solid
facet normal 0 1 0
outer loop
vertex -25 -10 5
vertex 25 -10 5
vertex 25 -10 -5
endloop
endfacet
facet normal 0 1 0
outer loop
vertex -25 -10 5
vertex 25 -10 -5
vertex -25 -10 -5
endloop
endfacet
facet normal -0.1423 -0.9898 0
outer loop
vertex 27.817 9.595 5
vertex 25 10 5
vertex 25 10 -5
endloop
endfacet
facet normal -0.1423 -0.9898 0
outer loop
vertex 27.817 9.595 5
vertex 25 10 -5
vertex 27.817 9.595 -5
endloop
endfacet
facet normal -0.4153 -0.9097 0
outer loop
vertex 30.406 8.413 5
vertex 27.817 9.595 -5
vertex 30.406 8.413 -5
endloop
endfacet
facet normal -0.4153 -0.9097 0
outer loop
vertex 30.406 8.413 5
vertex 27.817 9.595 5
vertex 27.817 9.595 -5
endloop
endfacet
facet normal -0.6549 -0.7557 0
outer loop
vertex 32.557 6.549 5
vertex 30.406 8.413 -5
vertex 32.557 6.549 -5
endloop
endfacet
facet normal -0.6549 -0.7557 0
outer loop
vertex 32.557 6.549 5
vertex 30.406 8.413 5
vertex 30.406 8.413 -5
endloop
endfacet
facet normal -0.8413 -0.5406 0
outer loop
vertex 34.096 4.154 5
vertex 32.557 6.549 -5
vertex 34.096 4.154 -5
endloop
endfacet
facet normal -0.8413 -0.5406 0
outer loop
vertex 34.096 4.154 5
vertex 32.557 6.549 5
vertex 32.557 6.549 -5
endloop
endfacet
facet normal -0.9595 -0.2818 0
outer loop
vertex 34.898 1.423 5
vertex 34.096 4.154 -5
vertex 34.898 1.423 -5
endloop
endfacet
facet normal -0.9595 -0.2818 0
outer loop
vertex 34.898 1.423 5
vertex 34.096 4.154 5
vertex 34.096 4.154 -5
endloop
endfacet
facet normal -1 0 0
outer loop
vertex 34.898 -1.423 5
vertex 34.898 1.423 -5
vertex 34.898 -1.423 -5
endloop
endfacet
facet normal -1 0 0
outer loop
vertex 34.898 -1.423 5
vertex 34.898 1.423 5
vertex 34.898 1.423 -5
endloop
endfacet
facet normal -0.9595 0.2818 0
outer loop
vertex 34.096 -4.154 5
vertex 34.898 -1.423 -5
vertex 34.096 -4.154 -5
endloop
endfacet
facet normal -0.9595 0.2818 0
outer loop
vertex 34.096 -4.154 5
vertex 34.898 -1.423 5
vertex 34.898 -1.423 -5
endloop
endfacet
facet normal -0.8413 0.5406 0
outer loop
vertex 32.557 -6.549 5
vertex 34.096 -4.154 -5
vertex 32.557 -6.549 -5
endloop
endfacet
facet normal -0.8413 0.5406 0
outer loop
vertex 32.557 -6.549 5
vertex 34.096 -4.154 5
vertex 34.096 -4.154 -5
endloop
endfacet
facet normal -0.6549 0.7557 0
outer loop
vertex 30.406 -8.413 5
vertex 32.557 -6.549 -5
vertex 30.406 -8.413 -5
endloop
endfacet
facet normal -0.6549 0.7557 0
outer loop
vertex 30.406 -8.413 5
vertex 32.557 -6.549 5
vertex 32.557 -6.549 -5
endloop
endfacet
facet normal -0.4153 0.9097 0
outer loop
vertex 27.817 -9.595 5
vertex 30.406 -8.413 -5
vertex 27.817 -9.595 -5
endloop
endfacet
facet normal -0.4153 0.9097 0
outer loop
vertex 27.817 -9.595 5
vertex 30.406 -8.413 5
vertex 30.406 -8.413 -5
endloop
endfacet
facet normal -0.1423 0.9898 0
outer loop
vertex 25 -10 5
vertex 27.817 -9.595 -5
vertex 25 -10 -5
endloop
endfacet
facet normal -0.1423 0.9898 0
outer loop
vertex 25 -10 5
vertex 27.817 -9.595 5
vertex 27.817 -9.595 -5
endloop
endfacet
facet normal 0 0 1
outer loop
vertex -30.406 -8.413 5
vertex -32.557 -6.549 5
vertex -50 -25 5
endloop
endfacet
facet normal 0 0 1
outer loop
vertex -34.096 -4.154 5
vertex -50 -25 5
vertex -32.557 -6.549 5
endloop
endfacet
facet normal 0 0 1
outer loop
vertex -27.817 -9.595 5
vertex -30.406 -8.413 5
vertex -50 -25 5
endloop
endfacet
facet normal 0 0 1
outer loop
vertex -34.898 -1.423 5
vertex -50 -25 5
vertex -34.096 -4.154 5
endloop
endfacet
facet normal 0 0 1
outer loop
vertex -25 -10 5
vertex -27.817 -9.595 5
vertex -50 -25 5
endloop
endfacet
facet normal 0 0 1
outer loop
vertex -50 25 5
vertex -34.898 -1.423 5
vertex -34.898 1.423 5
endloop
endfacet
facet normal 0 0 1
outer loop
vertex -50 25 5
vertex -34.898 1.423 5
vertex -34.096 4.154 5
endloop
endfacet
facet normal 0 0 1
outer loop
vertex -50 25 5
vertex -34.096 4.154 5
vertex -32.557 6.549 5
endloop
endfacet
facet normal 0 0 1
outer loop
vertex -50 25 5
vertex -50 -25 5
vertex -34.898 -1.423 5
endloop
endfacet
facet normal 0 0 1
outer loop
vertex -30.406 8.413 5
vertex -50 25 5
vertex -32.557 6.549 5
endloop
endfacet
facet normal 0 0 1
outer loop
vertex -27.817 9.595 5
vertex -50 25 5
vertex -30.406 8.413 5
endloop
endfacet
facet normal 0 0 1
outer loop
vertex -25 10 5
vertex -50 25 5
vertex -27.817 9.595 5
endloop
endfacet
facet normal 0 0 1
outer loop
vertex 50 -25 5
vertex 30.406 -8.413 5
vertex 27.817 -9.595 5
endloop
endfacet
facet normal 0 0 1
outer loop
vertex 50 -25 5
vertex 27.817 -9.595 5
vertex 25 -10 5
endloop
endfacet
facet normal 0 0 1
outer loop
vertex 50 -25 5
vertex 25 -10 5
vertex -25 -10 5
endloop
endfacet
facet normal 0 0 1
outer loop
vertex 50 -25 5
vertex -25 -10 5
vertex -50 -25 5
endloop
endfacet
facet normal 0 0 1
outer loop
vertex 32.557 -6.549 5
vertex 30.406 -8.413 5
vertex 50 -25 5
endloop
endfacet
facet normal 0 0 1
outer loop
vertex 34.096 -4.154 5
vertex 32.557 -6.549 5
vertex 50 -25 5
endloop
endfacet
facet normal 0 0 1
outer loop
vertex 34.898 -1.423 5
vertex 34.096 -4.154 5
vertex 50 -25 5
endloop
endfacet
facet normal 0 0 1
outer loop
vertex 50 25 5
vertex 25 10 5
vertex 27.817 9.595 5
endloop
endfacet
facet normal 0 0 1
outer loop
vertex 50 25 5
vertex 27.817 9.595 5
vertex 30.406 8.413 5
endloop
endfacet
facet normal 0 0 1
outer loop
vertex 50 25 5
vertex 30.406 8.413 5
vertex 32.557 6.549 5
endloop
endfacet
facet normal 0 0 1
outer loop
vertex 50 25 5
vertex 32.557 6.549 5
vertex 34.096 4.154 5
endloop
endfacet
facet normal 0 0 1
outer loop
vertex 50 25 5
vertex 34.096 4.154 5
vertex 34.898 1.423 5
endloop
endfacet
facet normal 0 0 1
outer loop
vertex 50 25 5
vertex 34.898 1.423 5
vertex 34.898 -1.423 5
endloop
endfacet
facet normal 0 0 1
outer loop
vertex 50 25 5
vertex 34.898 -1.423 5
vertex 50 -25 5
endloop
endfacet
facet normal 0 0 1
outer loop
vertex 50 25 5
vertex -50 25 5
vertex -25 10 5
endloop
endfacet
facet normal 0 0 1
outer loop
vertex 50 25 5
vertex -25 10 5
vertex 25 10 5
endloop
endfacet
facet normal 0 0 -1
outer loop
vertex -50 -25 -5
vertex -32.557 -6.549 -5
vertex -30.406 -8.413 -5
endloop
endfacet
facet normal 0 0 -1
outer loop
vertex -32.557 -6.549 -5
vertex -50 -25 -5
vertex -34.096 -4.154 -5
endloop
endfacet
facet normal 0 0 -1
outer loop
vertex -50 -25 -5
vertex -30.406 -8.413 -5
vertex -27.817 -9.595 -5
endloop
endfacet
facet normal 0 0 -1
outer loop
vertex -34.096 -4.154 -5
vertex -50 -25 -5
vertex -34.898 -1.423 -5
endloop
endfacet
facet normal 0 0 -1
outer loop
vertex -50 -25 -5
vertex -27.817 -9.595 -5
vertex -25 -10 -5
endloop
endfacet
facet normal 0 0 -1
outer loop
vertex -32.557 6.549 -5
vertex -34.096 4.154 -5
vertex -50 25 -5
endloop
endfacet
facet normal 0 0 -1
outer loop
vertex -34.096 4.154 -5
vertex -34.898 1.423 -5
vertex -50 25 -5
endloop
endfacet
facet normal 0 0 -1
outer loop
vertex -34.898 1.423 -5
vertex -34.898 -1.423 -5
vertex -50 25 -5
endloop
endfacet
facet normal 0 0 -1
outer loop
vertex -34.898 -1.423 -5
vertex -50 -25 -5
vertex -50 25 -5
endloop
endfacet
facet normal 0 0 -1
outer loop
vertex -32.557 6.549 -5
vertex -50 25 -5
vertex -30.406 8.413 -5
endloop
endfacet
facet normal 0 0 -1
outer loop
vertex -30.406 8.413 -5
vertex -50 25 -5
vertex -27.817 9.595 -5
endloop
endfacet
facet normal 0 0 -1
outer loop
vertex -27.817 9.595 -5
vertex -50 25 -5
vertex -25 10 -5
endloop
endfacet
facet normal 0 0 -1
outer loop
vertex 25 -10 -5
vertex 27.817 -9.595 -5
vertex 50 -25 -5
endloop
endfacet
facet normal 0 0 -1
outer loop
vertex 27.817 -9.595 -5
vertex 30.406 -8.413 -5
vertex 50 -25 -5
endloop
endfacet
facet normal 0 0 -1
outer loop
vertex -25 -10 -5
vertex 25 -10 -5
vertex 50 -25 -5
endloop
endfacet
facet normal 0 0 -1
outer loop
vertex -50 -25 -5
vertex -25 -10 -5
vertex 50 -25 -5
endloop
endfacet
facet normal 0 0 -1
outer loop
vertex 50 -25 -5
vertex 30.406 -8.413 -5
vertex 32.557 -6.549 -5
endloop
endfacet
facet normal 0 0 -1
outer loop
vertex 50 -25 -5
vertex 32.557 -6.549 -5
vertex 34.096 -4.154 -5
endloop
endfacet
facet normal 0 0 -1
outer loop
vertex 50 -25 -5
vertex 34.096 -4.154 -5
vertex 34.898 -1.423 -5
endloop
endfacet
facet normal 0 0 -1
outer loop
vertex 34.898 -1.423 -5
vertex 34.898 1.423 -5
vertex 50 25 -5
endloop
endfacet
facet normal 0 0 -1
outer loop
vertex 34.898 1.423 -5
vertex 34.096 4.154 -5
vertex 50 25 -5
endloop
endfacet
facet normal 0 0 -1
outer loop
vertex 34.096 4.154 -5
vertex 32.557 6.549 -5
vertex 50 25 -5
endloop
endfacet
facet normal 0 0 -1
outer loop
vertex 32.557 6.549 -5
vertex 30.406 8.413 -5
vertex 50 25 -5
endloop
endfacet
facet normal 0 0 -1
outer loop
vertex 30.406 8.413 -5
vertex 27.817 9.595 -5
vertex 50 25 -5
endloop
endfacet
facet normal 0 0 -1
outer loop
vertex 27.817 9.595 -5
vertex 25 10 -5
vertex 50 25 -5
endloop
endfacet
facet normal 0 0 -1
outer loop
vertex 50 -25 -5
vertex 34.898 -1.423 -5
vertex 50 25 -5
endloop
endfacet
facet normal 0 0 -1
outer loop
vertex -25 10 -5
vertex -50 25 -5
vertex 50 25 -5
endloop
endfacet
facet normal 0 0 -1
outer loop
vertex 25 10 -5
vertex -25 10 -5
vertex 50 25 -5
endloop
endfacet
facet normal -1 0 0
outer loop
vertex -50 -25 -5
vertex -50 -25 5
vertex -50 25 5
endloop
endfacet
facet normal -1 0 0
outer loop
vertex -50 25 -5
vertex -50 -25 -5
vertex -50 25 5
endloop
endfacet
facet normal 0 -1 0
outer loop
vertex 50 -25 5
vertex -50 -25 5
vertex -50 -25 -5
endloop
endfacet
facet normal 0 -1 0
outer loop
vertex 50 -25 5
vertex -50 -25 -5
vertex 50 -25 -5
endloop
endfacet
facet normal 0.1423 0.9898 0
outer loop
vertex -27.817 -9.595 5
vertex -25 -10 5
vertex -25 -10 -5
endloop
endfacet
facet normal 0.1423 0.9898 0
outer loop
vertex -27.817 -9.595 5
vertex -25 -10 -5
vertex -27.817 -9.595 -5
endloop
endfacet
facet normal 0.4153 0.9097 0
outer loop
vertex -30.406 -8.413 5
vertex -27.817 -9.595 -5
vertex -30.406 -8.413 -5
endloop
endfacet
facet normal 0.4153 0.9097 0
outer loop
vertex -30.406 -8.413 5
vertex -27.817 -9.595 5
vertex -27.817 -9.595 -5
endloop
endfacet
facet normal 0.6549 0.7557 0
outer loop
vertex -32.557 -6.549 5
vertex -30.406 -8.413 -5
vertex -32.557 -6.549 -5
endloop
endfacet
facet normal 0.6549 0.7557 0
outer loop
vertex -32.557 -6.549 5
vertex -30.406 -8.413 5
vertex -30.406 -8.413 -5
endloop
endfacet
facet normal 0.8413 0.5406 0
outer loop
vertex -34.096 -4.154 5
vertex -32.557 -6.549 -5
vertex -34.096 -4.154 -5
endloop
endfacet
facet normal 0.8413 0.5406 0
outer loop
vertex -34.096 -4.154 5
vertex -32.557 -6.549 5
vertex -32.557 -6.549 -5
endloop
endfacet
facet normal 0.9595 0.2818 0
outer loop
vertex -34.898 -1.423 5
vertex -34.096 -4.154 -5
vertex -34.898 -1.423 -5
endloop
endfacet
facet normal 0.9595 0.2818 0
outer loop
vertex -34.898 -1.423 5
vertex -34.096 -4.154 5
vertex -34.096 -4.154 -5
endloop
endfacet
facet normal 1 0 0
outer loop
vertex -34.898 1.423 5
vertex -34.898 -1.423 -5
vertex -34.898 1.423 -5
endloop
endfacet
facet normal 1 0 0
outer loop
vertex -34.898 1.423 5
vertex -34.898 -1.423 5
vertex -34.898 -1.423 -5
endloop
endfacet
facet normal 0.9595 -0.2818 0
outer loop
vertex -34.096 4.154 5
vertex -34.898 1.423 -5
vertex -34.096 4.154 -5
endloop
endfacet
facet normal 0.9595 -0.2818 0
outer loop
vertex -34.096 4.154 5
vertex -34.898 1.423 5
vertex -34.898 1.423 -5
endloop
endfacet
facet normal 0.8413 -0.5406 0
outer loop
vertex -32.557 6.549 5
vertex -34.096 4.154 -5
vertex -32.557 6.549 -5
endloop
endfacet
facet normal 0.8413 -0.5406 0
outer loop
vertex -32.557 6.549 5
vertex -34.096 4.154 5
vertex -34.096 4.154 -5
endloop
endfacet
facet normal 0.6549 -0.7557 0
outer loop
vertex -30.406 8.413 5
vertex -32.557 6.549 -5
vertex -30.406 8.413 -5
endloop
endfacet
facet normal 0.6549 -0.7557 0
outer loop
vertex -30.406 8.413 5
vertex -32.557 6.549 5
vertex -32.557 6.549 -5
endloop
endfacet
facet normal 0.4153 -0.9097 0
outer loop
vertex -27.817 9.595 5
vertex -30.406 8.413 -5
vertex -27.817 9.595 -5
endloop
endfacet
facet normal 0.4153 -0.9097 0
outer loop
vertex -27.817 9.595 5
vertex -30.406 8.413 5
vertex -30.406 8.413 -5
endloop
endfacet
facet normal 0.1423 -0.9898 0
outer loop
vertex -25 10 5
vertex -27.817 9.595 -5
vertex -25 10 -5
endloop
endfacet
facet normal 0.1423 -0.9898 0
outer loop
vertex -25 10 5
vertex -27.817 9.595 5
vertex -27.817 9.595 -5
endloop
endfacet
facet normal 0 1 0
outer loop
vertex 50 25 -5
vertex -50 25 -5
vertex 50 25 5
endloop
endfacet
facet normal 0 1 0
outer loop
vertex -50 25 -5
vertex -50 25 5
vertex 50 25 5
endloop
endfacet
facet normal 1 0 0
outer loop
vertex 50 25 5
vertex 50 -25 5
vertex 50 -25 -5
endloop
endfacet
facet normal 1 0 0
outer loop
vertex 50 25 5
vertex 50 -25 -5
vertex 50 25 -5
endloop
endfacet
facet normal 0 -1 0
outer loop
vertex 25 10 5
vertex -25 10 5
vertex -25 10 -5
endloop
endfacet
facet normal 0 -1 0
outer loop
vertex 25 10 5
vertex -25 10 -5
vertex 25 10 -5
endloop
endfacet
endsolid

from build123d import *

# Parameters (mm, degrees)
SKETCH2_W       = 100
SKETCH2_H       = 50
BOX_DEPTH       = 5
HOLE_DEPTH      = 6
HOLE_DEPTH_BACK = 6


with BuildPart() as part:
    # Sketch2 → Box (new body, symmetric)
    with BuildSketch(Plane.XY):
        Rectangle(SKETCH2_W, SKETCH2_H)
    extrude(amount=BOX_DEPTH, both=True)

    # Sketch3 → Hole (cut, two sides)
    with BuildSketch(Plane.XY) as hole_sk:
        with BuildLine():
            Line((-25, 10), (25, 10))
            ThreePointArc((25, 10), (35, 0), (25, -10))
            Line((25, -10), (-25, -10))
            ThreePointArc((-25, -10), (-35, 0), (-25, 10))
        make_face()
    extrude(amount=HOLE_DEPTH, mode=Mode.SUBTRACT)
    extrude(hole_sk.sketch, amount=-HOLE_DEPTH_BACK, mode=Mode.SUBTRACT)


solid = part.part
